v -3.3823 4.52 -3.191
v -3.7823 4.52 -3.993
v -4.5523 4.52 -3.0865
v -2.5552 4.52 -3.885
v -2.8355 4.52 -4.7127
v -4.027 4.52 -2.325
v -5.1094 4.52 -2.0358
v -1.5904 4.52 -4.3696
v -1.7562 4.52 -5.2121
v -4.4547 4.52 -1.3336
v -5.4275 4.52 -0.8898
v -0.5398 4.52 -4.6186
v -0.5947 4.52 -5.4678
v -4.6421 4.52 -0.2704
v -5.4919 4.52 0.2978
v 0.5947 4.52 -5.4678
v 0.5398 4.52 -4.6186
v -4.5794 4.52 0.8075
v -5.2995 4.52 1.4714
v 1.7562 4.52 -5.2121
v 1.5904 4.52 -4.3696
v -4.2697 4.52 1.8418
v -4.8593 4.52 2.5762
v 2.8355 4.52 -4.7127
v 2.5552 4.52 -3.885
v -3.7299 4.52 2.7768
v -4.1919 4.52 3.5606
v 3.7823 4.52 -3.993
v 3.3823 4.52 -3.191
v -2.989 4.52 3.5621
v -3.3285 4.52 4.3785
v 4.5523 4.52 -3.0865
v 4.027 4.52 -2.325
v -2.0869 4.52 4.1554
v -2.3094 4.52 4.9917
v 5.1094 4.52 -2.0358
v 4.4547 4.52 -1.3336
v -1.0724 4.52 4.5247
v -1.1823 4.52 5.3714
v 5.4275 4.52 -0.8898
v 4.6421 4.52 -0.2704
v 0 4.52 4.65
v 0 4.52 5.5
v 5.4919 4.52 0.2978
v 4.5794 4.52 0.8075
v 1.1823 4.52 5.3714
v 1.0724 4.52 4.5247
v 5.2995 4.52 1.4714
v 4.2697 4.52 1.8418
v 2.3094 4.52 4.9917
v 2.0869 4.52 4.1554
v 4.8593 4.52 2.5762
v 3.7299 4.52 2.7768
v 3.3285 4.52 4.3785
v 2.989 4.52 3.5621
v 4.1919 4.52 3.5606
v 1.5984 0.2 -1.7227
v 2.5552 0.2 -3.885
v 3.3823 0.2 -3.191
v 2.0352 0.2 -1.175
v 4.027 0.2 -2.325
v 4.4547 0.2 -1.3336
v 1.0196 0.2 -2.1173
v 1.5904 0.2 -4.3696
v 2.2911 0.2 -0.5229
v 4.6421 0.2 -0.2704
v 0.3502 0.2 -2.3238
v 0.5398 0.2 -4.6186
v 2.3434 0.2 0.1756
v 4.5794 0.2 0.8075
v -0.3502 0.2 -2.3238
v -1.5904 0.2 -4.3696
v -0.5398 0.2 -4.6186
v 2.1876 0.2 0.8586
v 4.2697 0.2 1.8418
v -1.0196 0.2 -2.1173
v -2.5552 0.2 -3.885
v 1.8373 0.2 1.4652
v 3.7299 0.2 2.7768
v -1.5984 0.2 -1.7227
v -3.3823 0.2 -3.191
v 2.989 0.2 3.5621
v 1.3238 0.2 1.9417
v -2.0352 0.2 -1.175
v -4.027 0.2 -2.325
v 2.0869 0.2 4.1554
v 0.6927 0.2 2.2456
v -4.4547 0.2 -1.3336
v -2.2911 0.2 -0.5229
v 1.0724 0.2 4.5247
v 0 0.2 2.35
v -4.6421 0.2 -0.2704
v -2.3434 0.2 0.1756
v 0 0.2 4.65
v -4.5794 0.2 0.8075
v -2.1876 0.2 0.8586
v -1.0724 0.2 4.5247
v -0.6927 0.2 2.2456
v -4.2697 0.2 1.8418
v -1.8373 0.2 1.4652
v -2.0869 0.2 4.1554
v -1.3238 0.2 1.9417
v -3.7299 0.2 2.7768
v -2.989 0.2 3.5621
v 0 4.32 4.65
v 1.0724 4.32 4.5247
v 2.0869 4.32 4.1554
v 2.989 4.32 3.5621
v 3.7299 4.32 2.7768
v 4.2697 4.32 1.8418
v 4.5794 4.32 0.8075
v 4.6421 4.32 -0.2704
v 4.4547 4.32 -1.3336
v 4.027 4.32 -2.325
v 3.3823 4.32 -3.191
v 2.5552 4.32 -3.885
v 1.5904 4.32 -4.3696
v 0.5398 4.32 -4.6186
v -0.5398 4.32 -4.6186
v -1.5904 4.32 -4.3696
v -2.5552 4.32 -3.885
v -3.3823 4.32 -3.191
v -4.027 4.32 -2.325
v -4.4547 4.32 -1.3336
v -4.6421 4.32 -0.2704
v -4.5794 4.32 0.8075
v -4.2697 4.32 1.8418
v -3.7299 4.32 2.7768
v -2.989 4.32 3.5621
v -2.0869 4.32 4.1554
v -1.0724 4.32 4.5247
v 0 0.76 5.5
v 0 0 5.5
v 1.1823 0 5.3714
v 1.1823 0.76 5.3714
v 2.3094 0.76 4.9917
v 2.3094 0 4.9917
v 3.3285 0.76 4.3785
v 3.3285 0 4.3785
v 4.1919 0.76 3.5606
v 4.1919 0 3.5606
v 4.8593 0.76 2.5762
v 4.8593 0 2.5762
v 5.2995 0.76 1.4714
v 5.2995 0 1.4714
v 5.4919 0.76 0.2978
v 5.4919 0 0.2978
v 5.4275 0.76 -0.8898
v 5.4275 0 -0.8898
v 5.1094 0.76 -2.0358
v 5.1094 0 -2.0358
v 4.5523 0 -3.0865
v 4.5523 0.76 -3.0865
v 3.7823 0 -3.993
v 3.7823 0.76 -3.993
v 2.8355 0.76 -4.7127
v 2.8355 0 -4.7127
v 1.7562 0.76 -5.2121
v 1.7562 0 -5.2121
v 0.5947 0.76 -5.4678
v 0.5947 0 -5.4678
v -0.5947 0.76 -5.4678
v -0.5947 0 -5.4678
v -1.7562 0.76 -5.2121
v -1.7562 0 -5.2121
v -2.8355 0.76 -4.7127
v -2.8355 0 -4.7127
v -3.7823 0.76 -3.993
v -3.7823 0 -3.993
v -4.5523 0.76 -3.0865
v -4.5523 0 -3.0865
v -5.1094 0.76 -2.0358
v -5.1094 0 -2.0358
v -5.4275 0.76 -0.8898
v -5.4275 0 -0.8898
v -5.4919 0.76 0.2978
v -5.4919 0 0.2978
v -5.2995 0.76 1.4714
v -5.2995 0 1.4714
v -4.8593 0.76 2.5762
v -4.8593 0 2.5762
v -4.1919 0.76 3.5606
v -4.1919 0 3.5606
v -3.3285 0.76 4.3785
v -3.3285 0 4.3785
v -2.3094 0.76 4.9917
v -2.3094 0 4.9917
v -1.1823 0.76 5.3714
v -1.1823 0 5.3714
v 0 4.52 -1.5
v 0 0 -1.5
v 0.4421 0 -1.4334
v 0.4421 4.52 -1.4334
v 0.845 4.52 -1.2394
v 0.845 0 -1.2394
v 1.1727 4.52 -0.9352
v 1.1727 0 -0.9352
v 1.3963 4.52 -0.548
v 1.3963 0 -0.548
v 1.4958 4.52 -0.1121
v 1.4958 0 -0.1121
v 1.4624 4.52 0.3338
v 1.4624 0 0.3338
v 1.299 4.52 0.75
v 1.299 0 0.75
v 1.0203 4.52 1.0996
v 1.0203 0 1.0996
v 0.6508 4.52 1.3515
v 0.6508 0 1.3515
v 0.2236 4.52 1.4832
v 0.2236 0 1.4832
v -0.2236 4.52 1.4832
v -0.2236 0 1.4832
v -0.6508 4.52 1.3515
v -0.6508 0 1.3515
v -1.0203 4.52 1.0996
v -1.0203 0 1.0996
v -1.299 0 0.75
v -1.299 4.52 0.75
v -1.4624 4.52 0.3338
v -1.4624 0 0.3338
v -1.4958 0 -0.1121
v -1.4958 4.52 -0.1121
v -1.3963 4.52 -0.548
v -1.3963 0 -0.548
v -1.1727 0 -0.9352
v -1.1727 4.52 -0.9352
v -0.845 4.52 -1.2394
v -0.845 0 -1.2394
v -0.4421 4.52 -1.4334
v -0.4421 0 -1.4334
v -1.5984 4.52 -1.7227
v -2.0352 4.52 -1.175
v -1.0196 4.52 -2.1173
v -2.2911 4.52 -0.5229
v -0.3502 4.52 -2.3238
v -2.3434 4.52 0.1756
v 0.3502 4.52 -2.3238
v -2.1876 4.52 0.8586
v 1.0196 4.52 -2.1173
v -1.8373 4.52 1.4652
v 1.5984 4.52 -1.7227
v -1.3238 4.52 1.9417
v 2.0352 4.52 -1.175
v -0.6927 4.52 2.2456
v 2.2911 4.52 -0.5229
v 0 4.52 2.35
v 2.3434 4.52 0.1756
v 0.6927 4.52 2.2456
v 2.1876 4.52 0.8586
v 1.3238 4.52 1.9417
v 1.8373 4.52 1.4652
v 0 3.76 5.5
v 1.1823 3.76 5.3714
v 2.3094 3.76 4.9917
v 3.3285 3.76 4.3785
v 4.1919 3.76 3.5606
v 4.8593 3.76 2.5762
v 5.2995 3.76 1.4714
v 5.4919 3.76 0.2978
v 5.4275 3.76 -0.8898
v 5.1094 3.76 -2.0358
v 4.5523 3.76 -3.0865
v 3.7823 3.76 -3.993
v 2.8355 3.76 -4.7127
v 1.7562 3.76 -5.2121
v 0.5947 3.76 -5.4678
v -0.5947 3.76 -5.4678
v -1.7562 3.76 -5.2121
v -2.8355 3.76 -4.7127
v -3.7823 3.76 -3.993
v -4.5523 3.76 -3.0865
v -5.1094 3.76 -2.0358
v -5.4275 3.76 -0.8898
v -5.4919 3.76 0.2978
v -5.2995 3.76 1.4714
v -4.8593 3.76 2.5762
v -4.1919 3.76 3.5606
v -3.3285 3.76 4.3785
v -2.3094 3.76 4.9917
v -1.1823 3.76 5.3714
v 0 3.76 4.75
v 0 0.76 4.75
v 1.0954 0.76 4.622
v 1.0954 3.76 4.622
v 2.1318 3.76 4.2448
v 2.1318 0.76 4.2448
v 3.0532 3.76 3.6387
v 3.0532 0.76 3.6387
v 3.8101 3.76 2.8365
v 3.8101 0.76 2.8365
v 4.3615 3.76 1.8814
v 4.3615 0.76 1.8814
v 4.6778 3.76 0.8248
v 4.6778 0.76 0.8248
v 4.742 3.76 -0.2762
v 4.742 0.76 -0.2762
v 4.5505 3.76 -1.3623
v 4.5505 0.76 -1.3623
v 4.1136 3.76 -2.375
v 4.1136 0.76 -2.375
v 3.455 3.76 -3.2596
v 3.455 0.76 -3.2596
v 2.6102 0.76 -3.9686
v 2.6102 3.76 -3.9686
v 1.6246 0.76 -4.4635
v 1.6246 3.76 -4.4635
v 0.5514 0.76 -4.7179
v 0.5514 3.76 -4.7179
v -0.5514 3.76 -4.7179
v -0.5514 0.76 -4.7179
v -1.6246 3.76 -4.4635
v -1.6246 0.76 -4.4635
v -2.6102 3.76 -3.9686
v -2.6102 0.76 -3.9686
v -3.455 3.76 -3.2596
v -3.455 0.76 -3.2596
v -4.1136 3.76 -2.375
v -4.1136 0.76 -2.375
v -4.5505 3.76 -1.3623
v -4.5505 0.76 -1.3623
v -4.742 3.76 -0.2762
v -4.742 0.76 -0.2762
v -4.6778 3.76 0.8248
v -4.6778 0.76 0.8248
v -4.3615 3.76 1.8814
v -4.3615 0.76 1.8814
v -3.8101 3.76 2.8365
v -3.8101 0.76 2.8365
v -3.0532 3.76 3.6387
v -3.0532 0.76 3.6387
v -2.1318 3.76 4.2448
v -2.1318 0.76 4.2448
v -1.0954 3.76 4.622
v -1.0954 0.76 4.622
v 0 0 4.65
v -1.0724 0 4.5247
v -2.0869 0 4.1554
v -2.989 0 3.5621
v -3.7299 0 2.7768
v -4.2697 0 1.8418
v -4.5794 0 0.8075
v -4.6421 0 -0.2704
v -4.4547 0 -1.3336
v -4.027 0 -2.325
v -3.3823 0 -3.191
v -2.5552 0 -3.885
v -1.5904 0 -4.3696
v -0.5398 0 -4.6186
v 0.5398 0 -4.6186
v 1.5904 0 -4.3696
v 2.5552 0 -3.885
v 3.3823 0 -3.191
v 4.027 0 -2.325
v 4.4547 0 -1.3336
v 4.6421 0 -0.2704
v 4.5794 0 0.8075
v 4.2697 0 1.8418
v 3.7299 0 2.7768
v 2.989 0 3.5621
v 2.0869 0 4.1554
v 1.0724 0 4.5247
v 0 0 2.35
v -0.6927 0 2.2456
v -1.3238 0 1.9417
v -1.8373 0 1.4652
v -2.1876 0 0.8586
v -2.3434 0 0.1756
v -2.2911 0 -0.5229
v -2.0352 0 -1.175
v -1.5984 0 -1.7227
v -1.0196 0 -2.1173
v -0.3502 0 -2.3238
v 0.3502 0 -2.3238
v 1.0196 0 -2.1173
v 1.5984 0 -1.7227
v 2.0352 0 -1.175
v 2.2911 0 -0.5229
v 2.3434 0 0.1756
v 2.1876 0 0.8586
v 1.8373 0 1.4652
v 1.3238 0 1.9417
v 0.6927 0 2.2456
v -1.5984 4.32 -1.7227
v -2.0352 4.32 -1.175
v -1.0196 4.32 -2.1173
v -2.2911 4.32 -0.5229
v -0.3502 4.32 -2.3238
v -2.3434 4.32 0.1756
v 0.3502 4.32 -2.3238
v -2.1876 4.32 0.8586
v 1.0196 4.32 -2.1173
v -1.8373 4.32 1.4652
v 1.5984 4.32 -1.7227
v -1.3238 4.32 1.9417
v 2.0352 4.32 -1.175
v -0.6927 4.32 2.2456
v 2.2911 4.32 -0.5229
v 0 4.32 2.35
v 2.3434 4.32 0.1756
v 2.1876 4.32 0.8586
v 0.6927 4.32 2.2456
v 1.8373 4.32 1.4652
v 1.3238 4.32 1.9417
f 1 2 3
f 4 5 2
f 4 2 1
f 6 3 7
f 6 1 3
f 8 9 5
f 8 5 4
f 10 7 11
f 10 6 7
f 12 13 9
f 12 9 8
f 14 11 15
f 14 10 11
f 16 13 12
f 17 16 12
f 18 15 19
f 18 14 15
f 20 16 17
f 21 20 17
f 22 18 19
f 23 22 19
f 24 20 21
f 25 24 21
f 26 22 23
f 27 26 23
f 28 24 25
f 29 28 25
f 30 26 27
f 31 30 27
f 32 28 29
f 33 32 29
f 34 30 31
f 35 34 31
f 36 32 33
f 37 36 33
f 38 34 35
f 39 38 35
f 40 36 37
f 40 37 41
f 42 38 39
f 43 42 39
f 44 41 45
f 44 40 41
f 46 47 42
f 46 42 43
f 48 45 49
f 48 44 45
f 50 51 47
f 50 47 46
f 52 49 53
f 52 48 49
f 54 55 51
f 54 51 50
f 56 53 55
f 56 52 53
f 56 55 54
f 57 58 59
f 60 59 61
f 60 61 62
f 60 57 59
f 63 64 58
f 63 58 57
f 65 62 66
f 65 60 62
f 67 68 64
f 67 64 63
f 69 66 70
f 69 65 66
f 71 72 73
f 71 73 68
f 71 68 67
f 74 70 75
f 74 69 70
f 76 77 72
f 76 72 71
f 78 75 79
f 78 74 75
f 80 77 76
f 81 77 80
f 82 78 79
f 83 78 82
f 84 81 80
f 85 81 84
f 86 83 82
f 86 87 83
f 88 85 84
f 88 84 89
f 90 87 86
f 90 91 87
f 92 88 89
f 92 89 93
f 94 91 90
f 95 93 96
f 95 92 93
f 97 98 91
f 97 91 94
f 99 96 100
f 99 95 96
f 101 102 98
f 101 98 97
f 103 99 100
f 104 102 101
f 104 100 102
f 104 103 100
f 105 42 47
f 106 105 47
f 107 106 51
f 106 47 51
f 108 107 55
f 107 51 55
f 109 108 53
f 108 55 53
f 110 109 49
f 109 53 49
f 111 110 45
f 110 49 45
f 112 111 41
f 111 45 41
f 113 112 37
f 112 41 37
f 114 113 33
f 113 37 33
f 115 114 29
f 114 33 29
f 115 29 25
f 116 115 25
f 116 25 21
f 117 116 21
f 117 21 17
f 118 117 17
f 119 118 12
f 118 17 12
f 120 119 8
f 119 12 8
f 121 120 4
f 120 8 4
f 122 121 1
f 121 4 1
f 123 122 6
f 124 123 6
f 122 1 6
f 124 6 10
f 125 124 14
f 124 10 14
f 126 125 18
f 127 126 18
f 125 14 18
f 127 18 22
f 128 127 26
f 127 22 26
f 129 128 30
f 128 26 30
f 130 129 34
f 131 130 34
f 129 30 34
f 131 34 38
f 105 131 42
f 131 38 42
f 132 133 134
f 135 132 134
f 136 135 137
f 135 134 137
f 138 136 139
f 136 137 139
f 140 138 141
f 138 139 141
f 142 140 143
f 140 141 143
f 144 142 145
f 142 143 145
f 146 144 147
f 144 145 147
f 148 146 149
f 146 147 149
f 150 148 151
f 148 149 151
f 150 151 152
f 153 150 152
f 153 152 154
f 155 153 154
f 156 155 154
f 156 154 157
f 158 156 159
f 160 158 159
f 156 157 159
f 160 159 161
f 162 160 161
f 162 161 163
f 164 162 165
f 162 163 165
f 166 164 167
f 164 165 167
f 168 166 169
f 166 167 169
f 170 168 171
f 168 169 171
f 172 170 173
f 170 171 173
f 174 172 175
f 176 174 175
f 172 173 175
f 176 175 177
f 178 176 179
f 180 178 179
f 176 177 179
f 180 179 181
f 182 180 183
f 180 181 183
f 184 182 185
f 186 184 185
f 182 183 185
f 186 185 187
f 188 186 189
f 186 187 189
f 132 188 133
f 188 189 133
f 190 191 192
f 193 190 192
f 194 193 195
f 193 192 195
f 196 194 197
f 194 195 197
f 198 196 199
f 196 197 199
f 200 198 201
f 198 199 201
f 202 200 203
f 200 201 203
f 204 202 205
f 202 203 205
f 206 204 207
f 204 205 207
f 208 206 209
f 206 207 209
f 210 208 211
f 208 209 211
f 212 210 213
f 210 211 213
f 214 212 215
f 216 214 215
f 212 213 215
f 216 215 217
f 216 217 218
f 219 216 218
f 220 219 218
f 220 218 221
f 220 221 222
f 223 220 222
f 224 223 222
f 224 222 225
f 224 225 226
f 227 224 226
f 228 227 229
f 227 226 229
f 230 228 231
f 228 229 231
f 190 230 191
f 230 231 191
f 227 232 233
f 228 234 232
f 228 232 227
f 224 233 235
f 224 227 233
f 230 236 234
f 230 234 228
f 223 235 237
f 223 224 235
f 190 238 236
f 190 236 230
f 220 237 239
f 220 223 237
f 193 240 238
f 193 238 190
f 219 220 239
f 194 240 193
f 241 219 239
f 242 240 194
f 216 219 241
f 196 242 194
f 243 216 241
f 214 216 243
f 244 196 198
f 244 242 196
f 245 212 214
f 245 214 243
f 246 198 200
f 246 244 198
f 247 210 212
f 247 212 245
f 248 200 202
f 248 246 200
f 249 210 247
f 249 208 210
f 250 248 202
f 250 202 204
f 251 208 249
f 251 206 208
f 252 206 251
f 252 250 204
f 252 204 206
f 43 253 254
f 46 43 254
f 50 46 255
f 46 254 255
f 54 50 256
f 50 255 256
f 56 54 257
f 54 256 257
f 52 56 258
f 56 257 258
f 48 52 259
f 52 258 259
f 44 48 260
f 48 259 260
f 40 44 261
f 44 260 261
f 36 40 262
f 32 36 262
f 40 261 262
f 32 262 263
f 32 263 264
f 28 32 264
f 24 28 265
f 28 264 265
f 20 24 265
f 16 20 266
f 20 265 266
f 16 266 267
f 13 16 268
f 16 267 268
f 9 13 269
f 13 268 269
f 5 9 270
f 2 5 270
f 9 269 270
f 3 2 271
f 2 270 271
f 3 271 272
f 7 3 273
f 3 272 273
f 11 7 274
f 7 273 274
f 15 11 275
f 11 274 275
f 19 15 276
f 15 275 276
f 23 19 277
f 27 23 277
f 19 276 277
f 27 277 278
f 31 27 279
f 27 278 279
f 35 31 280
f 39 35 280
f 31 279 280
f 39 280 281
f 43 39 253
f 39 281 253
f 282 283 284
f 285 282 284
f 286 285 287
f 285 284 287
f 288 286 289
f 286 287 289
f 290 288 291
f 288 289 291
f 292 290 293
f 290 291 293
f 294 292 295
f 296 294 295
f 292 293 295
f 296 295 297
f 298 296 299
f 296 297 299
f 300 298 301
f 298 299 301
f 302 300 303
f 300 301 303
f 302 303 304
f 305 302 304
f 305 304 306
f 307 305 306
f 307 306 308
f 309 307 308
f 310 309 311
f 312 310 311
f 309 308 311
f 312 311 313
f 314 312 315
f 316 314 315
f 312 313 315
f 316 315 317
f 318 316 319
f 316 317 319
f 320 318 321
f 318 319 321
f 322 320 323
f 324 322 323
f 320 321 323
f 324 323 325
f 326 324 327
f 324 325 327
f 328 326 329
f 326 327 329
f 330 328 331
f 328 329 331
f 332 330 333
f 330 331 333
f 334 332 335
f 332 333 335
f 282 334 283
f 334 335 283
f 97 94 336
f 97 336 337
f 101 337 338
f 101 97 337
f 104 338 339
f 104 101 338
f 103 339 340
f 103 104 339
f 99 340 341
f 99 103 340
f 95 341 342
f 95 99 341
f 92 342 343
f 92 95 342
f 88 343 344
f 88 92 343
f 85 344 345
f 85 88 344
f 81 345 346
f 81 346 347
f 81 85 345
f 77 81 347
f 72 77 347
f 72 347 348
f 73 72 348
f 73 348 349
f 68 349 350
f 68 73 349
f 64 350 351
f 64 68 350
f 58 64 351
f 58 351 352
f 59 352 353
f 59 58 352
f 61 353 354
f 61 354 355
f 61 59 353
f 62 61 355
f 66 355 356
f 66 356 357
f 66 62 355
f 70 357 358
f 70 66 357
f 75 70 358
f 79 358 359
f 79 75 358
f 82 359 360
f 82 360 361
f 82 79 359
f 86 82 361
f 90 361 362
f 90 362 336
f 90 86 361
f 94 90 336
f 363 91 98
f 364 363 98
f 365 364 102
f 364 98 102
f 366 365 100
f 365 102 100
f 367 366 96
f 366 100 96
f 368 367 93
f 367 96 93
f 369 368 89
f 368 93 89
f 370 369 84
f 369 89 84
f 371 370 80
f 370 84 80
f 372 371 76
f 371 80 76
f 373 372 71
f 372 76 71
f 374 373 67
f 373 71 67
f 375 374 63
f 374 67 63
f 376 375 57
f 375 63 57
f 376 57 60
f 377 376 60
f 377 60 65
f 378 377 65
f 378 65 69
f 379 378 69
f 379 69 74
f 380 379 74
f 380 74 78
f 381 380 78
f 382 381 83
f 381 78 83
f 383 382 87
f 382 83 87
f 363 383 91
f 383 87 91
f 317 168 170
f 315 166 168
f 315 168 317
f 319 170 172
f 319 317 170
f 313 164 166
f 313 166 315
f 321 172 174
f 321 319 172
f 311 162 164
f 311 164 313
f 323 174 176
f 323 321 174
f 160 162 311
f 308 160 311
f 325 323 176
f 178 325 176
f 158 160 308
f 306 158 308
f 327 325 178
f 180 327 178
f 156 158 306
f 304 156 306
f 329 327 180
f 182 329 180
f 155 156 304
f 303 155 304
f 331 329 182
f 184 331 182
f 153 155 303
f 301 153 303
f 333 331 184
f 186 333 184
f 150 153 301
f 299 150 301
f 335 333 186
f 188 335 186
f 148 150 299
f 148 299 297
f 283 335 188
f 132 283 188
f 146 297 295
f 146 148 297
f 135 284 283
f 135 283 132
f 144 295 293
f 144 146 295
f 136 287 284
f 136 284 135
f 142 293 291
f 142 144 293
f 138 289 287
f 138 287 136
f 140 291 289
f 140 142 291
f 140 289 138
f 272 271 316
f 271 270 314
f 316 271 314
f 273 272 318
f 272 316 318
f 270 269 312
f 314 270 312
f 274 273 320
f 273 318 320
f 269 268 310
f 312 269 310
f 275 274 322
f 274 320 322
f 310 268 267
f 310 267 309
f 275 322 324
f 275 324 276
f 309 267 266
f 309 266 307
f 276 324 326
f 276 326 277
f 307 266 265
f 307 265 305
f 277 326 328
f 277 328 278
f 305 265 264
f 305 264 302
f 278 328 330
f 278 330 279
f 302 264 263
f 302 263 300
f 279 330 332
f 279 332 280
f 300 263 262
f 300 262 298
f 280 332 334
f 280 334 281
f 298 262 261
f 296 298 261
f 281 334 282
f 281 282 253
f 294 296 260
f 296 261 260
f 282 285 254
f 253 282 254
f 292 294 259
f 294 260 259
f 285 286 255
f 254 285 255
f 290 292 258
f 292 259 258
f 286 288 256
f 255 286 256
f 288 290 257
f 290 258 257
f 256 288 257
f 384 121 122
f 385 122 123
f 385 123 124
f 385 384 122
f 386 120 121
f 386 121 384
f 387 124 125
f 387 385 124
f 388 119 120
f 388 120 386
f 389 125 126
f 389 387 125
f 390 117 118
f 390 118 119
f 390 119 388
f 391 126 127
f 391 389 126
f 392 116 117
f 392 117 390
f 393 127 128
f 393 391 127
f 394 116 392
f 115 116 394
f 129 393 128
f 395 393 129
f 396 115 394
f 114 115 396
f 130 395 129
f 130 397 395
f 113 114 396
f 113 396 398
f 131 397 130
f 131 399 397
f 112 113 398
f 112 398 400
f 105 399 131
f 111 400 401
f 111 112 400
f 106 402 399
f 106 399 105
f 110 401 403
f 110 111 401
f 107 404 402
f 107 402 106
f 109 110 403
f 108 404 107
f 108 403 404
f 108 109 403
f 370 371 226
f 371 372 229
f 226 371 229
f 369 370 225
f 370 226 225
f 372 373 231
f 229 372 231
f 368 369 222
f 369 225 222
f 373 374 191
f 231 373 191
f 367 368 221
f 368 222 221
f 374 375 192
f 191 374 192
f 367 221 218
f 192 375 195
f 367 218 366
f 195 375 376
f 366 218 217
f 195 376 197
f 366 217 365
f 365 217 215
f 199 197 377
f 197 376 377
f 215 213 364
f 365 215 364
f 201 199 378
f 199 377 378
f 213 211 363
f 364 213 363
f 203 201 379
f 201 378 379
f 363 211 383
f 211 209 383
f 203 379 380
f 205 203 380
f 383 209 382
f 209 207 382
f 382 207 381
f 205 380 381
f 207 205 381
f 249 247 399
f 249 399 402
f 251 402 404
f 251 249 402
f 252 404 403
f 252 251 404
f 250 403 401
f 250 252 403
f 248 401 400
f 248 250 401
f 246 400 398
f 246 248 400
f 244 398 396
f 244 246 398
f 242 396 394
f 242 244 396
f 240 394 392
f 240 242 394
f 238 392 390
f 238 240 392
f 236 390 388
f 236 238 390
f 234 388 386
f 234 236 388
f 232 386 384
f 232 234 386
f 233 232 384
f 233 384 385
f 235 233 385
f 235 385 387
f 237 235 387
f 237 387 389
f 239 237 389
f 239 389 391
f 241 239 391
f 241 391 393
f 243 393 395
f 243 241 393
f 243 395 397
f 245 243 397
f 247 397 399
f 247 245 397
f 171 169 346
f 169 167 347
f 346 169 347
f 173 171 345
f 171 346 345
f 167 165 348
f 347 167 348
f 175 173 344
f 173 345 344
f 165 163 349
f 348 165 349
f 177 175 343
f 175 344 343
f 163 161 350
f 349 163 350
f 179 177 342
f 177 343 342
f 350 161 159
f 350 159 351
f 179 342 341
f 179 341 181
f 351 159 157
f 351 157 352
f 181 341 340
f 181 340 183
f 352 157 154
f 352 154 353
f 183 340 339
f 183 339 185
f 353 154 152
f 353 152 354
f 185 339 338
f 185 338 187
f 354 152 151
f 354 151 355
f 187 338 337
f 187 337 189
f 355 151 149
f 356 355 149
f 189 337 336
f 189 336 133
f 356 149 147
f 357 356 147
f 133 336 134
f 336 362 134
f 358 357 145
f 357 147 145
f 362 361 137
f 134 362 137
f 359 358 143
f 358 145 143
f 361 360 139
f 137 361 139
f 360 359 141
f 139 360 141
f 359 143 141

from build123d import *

# Parameters (mm, degrees)
SKETCH1_R           = 5.5
BOSS_EXTRUDE1_DEPTH = 0.76
SKETCH2_R           = 4.75
BOSS_EXTRUDE2_DEPTH = 3
SKETCH3_R           = 5.5
BOSS_EXTRUDE3_DEPTH = 0.76
SKETCH4_R           = 1.5
CUT_EXTRUDE1_DEPTH  = 4.52
SKETCH5_R           = 4.65
SKETCH5_R_2         = 2.35
CUT_EXTRUDE2_DEPTH  = 0.2
CUT_EXTRUDE3_START  = -0.2
SKETCH6_R           = 4.65
SKETCH6_R_2         = 2.35
CUT_EXTRUDE3_DEPTH  = 0.2


with BuildPart() as part:
    # Sketch1 → Boss-Extrude1 (new body)
    with BuildSketch(Plane(origin=(0, 0, 0), x_dir=(1, 0, 0), z_dir=(0, 1, 0))):
        with Locations(Location((0, 0, 0), (0, 0, 270))):
            Circle(SKETCH1_R)
    extrude(amount=BOSS_EXTRUDE1_DEPTH)

    # Sketch2 → Boss-Extrude2 (add)
    with BuildSketch(Plane(origin=(0, 0.76, 0), x_dir=(1, 0, 0), z_dir=(0, 1, 0))):
        with Locations(Location((0, 0, 0), (0, 0, 270))):
            Circle(SKETCH2_R)
    extrude(amount=BOSS_EXTRUDE2_DEPTH)

    # Sketch3 → Boss-Extrude3 (add)
    with BuildSketch(Plane(origin=(0, 3.76, 0), x_dir=(1, 0, 0), z_dir=(0, 1, 0))):
        with Locations(Location((0, 0, 0), (0, 0, 270))):
            Circle(SKETCH3_R)
    extrude(amount=BOSS_EXTRUDE3_DEPTH)

    # Sketch4 → Cut-Extrude1 (cut)
    with BuildSketch(Plane.XZ):
        with Locations(Location((0, 0, 0), (0, 0, 270))):
            Circle(SKETCH4_R)
    extrude(amount=-CUT_EXTRUDE1_DEPTH, mode=Mode.SUBTRACT)

    # Sketch5 → Cut-Extrude2 (cut)
    with BuildSketch(Plane(origin=(0, 4.52, 0), x_dir=(1, 0, 0), z_dir=(0, 1, 0))):
        with Locations(Location((0, 0, 0), (0, 0, 270))):
            Circle(SKETCH5_R)
        with Locations(Location((0, 0, 0), (0, 0, 270))):
            Circle(SKETCH5_R_2, mode=Mode.SUBTRACT)
    extrude(amount=-CUT_EXTRUDE2_DEPTH, mode=Mode.SUBTRACT)

    # Sketch6 → Cut-Extrude3 (cut)
    with BuildSketch(Plane.XZ.offset(CUT_EXTRUDE3_START)):
        with Locations(Location((0, 0, 0), (0, 0, 90))):
            Circle(SKETCH6_R)
        with Locations(Location((0, 0, 0), (0, 0, 90))):
            Circle(SKETCH6_R_2, mode=Mode.SUBTRACT)
    extrude(amount=CUT_EXTRUDE3_DEPTH, mode=Mode.SUBTRACT)


solid = part.part
